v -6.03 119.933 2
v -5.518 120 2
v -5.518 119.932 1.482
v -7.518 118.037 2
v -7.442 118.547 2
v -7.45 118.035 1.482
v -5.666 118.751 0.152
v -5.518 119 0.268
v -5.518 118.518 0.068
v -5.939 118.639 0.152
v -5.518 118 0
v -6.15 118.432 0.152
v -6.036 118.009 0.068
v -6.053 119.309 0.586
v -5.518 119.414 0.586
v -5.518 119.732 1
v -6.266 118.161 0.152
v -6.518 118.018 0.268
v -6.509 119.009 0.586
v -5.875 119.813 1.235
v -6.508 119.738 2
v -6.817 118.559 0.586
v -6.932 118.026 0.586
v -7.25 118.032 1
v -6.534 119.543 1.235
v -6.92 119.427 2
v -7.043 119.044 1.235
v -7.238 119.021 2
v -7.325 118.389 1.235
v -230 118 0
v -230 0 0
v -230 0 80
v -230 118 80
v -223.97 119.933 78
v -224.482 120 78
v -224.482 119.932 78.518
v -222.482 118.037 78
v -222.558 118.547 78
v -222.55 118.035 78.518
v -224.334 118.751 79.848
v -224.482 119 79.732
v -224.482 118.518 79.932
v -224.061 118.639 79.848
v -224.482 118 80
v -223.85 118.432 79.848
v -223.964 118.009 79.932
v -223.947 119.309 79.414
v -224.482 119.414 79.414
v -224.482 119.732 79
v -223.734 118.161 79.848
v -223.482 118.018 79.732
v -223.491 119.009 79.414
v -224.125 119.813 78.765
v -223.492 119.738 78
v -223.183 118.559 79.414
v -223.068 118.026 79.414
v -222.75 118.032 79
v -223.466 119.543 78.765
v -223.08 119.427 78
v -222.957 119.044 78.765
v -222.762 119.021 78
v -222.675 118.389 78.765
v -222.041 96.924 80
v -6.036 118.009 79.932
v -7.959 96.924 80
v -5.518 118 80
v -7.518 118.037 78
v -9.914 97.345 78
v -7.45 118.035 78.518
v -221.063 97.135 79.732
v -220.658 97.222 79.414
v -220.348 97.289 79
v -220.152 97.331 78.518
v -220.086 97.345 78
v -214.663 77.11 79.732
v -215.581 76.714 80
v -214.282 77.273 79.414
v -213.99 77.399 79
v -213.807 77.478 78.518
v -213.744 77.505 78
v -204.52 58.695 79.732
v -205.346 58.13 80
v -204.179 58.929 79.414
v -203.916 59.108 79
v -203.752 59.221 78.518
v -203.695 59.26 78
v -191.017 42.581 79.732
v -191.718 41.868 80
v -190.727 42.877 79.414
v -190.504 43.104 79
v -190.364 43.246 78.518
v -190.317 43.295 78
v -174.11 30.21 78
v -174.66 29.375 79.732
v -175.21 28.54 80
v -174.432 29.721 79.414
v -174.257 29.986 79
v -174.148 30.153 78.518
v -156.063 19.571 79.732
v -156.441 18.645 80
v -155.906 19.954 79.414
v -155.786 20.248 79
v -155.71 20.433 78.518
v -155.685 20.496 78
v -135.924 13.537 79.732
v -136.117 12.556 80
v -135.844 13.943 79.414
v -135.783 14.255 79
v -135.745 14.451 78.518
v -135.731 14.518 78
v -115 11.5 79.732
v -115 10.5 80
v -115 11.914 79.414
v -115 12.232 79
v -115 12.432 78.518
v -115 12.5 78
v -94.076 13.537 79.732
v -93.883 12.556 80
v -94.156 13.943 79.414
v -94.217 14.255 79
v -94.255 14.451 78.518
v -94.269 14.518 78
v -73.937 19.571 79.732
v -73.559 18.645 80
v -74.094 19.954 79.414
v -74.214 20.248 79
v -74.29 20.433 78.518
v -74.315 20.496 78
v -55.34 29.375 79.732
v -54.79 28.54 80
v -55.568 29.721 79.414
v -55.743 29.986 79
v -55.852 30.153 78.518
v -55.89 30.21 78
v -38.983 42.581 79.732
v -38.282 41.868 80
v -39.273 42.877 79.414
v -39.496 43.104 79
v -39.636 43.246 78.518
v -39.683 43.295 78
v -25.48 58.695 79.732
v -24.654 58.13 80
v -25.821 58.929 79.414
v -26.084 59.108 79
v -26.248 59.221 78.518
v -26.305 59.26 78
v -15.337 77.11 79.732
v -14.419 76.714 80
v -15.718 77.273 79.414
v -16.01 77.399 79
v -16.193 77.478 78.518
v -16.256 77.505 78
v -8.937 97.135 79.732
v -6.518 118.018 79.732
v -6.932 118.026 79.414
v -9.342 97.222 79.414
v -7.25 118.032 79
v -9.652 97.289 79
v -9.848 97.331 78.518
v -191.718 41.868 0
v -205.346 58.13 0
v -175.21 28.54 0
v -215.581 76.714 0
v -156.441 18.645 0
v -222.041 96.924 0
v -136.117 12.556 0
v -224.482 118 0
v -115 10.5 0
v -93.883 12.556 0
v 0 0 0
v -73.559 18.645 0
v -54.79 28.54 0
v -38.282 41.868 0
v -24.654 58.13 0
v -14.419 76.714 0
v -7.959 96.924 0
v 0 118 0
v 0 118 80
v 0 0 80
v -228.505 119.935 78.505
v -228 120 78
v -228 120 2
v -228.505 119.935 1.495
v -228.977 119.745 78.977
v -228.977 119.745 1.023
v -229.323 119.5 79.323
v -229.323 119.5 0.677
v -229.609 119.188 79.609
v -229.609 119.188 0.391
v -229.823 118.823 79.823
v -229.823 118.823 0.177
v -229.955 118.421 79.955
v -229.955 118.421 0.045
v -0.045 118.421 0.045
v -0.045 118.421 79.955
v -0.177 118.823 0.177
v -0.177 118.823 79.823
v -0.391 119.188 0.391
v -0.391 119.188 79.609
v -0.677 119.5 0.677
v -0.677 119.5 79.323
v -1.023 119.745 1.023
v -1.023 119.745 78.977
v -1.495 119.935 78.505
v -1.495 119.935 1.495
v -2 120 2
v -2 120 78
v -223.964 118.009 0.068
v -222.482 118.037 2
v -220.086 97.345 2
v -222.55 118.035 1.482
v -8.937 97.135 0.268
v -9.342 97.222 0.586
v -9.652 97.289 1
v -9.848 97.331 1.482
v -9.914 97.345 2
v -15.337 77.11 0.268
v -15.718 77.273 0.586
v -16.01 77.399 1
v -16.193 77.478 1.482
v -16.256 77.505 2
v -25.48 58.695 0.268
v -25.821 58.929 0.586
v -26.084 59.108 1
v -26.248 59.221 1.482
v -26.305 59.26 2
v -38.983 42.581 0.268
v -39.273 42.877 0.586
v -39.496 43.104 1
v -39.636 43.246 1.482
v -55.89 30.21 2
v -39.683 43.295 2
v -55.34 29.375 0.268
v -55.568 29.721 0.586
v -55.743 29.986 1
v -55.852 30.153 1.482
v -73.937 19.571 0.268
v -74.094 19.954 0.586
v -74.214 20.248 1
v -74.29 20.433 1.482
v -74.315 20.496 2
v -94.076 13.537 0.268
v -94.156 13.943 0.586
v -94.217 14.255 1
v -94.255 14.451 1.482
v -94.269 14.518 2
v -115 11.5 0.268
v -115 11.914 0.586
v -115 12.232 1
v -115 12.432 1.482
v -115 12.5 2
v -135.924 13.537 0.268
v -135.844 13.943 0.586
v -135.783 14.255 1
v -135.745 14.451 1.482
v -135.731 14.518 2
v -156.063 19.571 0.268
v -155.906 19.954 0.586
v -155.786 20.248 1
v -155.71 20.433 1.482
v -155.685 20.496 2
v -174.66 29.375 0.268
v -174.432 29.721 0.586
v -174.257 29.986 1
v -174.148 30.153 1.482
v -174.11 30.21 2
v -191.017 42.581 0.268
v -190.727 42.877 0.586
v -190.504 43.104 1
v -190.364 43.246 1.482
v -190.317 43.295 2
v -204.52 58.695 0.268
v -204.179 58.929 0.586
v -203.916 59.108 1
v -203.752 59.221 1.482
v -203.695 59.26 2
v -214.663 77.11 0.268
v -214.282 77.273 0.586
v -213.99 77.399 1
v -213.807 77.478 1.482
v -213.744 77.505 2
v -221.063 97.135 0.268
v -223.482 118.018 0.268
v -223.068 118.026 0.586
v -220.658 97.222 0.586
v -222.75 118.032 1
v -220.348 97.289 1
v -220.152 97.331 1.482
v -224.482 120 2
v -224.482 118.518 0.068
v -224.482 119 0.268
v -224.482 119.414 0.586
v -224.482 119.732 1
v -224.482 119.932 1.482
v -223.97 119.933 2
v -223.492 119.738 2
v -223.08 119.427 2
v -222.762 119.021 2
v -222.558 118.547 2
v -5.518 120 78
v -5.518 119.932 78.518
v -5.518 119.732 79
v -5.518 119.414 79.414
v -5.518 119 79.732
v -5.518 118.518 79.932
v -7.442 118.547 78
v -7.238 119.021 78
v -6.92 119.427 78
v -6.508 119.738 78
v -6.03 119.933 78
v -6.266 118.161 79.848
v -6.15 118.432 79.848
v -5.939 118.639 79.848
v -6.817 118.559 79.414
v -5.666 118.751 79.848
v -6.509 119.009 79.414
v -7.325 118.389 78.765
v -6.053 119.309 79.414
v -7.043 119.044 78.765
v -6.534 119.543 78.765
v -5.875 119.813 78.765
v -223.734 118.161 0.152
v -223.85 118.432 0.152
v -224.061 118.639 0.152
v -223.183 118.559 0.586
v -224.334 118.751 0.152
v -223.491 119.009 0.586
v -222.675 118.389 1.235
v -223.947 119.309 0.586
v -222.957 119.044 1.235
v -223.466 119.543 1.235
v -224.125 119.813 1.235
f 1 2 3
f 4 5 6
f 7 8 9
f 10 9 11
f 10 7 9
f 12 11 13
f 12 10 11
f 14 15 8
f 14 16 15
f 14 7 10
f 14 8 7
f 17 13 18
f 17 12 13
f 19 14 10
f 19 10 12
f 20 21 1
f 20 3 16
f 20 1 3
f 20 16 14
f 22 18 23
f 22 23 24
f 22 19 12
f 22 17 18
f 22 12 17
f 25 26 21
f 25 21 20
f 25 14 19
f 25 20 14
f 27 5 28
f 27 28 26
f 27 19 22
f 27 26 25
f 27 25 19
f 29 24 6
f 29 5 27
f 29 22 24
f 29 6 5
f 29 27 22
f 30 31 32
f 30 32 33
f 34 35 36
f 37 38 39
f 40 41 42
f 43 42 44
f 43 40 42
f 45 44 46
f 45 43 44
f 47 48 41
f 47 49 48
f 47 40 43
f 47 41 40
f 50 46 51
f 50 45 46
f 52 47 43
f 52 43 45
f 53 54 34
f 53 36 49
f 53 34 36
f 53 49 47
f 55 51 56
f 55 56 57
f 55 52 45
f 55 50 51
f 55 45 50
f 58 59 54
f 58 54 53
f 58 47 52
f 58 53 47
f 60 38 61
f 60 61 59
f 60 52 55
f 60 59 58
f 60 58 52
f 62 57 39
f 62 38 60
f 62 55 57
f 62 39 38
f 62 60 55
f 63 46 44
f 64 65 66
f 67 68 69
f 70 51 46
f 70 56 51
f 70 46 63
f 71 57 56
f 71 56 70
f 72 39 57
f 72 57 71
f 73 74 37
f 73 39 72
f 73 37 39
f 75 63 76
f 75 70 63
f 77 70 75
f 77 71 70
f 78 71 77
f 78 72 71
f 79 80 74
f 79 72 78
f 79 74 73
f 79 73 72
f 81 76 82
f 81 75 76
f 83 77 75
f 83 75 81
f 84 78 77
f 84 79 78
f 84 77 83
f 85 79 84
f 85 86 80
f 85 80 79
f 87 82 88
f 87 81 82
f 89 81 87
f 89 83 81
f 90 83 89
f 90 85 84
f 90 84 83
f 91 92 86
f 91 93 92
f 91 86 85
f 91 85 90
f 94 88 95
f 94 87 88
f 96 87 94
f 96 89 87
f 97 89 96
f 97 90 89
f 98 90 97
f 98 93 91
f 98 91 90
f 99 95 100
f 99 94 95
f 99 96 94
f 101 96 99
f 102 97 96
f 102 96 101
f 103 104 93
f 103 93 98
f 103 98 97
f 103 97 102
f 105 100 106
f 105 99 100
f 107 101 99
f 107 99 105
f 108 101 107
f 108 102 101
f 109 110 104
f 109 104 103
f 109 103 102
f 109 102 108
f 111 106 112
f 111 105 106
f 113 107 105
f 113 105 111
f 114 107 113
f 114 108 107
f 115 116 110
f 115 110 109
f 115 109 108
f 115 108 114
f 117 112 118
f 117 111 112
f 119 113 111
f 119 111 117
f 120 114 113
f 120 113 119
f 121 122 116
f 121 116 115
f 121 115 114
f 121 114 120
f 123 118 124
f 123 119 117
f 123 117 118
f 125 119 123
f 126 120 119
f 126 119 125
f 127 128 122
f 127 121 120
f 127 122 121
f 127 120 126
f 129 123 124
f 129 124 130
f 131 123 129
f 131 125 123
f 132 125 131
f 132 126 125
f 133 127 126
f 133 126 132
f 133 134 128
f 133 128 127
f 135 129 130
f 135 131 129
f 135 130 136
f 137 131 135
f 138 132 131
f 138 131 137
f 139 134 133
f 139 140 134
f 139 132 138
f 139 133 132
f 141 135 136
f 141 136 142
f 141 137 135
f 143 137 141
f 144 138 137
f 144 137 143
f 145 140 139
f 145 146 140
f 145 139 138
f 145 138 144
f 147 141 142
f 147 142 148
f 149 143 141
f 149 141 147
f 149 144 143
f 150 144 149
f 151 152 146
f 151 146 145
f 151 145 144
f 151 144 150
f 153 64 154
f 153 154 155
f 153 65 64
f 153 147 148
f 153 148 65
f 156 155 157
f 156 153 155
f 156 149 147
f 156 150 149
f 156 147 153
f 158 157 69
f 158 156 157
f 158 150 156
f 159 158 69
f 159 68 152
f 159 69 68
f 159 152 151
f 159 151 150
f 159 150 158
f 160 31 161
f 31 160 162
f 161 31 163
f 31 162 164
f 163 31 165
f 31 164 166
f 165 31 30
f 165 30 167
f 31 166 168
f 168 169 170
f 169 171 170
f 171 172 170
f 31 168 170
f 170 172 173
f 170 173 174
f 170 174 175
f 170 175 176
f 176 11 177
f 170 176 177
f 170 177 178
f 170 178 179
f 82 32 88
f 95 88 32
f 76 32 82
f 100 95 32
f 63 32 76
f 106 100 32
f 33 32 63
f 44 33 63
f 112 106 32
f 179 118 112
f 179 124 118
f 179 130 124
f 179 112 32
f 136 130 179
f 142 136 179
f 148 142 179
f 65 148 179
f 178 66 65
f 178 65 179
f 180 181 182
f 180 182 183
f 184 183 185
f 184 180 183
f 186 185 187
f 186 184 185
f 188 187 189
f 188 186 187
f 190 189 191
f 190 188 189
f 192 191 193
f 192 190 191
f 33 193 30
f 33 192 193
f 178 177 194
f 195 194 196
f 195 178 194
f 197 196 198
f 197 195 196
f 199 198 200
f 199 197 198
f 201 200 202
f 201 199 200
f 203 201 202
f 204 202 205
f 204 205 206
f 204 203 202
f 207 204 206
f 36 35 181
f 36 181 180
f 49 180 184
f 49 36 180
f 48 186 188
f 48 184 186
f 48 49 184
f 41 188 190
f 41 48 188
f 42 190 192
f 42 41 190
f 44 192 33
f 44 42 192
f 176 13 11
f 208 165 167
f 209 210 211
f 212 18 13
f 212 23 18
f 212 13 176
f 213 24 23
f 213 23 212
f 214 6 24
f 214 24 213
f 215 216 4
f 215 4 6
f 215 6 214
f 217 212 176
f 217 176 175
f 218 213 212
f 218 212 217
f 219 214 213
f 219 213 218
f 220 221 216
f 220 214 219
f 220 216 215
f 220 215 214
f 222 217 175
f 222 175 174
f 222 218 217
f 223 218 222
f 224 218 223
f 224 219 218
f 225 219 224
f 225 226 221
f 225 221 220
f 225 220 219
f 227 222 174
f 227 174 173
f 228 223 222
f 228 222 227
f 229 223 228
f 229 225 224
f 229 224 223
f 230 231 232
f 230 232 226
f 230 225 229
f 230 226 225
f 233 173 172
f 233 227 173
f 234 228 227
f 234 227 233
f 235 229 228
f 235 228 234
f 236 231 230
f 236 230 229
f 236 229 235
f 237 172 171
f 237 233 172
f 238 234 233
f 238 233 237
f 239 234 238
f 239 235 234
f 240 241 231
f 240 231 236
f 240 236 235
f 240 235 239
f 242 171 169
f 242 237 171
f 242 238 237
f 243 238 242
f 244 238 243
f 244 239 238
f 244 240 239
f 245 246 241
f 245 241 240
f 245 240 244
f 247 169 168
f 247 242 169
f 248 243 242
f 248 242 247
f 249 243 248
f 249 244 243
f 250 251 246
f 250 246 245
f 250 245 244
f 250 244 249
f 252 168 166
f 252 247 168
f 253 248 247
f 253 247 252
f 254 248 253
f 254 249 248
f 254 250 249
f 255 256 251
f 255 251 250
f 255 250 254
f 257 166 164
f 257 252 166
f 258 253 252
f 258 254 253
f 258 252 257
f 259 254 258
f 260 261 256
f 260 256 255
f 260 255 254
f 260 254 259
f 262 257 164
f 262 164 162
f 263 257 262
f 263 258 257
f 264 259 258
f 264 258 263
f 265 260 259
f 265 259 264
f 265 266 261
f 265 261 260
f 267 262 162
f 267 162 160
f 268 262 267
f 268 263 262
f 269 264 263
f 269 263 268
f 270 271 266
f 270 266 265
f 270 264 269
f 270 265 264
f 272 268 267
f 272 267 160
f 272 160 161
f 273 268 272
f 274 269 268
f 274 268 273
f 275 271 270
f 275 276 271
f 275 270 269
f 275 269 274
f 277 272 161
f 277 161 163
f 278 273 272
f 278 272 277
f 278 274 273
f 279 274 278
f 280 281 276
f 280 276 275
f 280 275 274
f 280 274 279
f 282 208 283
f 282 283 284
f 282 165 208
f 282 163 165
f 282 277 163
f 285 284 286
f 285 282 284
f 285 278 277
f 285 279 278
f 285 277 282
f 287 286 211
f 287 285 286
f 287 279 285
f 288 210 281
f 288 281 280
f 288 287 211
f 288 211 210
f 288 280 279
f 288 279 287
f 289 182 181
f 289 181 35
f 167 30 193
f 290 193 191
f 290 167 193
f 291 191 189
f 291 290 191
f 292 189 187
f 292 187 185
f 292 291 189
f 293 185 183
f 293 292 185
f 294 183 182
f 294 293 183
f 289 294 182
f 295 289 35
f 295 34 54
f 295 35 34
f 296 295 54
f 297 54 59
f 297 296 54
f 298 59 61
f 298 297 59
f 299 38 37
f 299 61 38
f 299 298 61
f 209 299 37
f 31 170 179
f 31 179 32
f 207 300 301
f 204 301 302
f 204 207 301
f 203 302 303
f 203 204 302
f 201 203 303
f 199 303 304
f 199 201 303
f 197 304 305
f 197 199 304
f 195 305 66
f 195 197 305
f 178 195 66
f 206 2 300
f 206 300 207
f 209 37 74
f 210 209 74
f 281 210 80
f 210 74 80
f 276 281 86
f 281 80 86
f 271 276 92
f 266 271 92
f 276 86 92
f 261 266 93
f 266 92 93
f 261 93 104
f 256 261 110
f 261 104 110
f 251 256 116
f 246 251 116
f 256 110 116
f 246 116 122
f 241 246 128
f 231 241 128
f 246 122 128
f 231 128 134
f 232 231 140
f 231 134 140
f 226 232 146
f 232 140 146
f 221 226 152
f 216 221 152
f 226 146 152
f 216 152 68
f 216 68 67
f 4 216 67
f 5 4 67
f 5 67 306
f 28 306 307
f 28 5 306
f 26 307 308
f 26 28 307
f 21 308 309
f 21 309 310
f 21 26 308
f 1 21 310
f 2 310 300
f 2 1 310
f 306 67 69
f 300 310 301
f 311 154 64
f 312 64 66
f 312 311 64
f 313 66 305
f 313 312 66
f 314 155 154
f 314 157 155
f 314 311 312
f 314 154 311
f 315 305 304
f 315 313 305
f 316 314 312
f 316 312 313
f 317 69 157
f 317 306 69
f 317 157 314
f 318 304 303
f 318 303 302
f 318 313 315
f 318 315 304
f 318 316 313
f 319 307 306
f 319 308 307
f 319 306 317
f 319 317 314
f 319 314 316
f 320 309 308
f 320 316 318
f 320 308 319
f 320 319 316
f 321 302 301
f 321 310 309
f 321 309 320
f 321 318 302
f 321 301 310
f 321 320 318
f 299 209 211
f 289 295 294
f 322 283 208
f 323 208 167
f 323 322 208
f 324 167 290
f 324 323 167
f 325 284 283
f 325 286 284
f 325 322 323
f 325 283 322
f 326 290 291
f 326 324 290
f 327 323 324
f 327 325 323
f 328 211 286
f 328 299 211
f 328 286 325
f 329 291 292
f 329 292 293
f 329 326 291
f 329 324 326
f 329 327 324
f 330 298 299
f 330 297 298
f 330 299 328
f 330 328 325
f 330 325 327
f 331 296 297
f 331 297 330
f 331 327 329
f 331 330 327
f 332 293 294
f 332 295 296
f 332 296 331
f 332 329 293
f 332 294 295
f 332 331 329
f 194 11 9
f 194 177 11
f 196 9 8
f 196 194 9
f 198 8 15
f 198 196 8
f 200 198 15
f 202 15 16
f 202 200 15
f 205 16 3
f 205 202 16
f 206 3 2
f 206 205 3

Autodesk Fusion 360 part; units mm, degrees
sketch "Sketch1" plane through (0, 0, 0) normal (0, 0, 1) x (1, 0, 0)
  line L0 (0, 0) -> (-230, 0)
  line L1 (-230, 0) -> (-230, 120)
  line L2 (-230, 120) -> (0, 120)
  line L3 (0, 120) -> (0, 0)
  dimension "d1" = 120
  dimension "d2" = 230
extrude "Extrude1" add sketch "Sketch1" along normal blind 80
sketch "Sketch2" plane through (0, 0, 80) normal (0, 0, 1) x (-1, 0, 0)
  line L0 (0, -120) -> (230, -120)
  line L1 (230, -120) -> (230, 0)
  line L2 (230, 0) -> (0, 0)
  line L3 (0, 0) -> (0, -120)
  circle A0 centre (115, -120) radius 107.5
  dimension "d5" = 215
extrude "Extrude2" cut sketch "Sketch2" against normal blind 170 contours L0 A0 picked at (128.0914, -86.6437)
fillet "Fillet1" radius 2 10 edges at (-222.5, 120, 40) (-230, 120, 40) (-7.5, 120, 40) (0, 120, 40) (-115, 12.5, 80) (-115, 12.5, 0) (-3.75, 120, 80) (-3.75, 120, 0) (-226.25, 120, 80) (-226.25, 120, 0)
